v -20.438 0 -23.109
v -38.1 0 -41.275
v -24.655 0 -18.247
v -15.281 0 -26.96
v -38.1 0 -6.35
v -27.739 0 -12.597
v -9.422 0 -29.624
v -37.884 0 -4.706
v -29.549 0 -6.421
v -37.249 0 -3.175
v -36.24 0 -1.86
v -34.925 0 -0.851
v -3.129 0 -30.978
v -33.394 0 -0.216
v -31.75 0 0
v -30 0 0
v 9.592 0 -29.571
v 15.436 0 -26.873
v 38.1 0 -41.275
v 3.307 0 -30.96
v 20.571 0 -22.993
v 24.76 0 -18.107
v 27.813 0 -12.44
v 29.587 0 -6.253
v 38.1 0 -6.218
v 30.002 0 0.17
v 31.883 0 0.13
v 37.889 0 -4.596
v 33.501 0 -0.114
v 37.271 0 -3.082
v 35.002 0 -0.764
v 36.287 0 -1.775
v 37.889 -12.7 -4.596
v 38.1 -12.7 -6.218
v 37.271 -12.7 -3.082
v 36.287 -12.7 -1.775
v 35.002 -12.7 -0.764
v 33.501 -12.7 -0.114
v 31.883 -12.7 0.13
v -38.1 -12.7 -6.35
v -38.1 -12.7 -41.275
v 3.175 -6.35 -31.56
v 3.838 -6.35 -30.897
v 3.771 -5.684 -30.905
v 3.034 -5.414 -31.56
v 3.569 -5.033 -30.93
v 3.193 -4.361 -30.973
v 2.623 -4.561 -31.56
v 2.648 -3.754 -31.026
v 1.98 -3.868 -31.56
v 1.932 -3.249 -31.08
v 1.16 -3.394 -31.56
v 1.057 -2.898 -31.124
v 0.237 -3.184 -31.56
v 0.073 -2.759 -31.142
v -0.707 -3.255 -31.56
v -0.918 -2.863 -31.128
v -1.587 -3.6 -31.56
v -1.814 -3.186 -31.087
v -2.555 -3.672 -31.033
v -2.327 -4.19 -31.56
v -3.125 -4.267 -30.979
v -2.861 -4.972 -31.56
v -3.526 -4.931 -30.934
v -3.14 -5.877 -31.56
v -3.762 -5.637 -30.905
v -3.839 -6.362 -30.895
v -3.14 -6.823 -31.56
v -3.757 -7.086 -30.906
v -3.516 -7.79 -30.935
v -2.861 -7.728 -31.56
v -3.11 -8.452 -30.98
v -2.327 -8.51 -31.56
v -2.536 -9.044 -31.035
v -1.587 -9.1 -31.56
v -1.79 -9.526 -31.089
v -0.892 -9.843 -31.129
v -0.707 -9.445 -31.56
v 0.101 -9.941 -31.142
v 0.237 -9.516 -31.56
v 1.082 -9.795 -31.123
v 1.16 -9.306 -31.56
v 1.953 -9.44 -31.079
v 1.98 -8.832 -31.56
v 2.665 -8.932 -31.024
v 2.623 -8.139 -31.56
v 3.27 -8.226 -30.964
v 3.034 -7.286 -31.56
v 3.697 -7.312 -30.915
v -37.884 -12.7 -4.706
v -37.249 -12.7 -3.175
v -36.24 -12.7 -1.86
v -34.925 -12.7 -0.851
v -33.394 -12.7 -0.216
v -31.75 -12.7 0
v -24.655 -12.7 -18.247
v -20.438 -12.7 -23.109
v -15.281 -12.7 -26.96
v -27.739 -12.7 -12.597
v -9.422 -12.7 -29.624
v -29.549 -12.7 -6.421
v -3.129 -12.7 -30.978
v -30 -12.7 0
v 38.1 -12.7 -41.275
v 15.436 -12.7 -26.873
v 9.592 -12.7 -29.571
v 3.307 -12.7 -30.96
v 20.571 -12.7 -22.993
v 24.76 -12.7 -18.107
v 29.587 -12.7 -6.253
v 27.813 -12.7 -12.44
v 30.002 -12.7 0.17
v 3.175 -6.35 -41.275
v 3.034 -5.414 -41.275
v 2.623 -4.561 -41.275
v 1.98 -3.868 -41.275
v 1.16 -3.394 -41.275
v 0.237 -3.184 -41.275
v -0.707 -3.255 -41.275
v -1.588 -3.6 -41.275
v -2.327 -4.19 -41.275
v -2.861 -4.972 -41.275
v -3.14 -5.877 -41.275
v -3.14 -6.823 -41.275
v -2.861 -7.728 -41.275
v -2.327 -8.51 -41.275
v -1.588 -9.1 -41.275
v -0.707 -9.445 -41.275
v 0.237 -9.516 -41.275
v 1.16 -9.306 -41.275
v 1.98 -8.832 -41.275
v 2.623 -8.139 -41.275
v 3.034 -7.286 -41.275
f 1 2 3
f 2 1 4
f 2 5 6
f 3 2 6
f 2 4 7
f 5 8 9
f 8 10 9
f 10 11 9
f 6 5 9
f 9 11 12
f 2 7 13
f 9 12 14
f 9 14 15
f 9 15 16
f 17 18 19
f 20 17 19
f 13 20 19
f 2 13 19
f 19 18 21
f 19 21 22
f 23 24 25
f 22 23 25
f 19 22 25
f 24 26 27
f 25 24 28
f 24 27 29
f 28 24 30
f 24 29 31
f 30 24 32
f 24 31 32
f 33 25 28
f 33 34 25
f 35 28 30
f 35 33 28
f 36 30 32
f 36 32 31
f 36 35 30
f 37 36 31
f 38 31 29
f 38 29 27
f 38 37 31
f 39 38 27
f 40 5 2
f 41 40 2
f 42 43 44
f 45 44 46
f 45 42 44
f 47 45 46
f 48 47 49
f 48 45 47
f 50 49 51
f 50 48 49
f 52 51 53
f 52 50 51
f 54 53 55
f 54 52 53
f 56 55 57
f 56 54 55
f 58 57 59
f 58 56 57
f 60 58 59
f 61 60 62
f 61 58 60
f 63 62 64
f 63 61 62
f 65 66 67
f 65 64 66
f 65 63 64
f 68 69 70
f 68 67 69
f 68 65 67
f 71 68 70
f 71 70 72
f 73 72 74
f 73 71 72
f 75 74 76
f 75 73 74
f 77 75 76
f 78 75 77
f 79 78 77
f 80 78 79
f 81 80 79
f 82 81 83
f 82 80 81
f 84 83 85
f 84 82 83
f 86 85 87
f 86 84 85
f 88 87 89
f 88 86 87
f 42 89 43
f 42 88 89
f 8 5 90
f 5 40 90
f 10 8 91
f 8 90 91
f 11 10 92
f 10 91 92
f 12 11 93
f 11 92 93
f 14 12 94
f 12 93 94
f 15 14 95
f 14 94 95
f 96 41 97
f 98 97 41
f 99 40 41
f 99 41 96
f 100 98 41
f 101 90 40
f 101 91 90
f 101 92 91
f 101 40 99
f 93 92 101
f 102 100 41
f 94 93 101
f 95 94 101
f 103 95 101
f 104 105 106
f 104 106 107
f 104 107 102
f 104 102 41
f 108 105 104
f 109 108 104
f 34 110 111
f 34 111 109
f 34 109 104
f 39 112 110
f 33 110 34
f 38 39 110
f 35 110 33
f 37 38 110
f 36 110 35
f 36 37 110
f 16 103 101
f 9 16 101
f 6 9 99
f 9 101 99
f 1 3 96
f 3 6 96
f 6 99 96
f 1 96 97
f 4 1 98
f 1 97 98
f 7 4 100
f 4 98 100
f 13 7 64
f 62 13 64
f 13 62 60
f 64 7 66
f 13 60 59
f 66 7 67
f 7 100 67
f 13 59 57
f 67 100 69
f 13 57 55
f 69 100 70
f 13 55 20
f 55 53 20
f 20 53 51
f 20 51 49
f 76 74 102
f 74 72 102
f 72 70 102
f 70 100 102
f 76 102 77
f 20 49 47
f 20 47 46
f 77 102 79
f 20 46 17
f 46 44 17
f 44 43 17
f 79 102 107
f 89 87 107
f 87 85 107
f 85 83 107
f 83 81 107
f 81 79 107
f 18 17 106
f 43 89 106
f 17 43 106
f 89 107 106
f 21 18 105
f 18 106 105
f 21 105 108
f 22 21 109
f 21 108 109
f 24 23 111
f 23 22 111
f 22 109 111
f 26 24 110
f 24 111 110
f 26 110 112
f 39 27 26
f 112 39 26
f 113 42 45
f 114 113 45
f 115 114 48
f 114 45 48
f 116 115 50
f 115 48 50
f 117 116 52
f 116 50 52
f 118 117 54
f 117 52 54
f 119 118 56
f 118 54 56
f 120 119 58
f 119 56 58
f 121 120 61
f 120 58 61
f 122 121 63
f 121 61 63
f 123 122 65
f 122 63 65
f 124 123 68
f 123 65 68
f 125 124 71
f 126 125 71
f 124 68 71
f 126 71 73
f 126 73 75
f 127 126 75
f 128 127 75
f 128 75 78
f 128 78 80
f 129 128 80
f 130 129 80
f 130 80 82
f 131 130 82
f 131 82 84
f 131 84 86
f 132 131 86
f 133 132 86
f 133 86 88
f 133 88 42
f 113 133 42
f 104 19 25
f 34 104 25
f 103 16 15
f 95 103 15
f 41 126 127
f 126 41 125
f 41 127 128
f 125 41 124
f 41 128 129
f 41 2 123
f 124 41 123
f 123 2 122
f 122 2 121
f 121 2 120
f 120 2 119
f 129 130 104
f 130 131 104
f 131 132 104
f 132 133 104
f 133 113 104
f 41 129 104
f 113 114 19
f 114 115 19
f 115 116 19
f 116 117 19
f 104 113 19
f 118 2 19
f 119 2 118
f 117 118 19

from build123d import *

# Parameters (mm, degrees)
F1_DEPTH    = 12.7
F3_R        = 4.7625
F4_DEPTH    = 6.35
F5_R        = 3.175
F6_DEPTH    = 12.7
F7_S5_R     = 30.0250138604
F7_T6_DEPTH = 8
F7_S7_R     = 3.175
F7_T8_DEPTH = 8
F8_R        = 6.35


# Not quite as in the source:
# - a fillet or chamfer that OpenCascade refuses, or shapes differently, is made with other operations: its cross-section is extruded or revolved along the edge and cut away or added


with BuildPart() as f1:
    # F0 (on Front) → F1 (new body)
    with BuildSketch(Plane.XZ):
        with BuildLine():
            Line((-38.1, 0), (-38.1, -41.275))
            Line((-38.1, -41.275), (38.1, -41.275))
            Line((38.1, -41.275), (38.1, 0))
            Line((38.1, 0), (30.0016984668, 0.169987541))
            ThreePointArc((30.0016984668, 0.169987541), (0.0893604764, -31.1423259445), (-29.9999146, 0))
            Line((-29.9999146, 0), (-38.1, 0))
        make_face()
    extrude(amount=F1_DEPTH)

    # F3 (on offset) → F4 (cut)
    with BuildSketch(Plane.XY.offset(-25.4)):
        with Locations((0, -6.35)):
            Circle(F3_R)
    extrude(amount=-F4_DEPTH, mode=Mode.SUBTRACT)

    # F5 (on face) → F6 (cut)
    with BuildSketch(Plane.XY.offset(-31.75)):
        with Locations((0, -6.35)):
            Circle(F5_R)
    extrude(amount=-F6_DEPTH, mode=Mode.SUBTRACT)

    # F7: chamfer of 1.778 on 1 edges, made by hand


with BuildPart() as f7_tool2:
    # F7_s3 → F7_t4 (revolve)
    with BuildSketch(Plane.XZ.offset(6.35)):
        Polygon((4.7625, -29.972), (2.9845, -31.75), (4.7625, -31.75), align=None)
    revolve(axis=Axis((0, -6.35, -31.75), (0, 0, 1)))

    # F7_s5 → F7_t6 (cut, symmetric)
    with BuildSketch(Plane.XZ.offset(6.3)):
        with Locations((0.0042984668, -1.1174325763)):
            Circle(F7_S5_R)
    extrude(amount=F7_T6_DEPTH, both=True, mode=Mode.SUBTRACT)

    # F7_s7 → F7_t8 (cut, symmetric)
    with BuildSketch(Plane.XY.offset(-30.9)):
        with Locations((0, -6.35)):
            Circle(F7_S7_R)
    extrude(amount=F7_T8_DEPTH, both=True, mode=Mode.SUBTRACT)


with BuildPart() as f1_1:
    add(f1.part)

    # F7_t1: union F7_tool2
    add(f7_tool2.part)

    # F8
    f8_edges = [f1_1.edges().sort_by_distance(p)[0] for p in [
        (-38.1, -6.35, 0),
        (38.1, -6.35, 0),
    ]]
    fillet(f8_edges, radius=F8_R)


solid = f1_1.part
